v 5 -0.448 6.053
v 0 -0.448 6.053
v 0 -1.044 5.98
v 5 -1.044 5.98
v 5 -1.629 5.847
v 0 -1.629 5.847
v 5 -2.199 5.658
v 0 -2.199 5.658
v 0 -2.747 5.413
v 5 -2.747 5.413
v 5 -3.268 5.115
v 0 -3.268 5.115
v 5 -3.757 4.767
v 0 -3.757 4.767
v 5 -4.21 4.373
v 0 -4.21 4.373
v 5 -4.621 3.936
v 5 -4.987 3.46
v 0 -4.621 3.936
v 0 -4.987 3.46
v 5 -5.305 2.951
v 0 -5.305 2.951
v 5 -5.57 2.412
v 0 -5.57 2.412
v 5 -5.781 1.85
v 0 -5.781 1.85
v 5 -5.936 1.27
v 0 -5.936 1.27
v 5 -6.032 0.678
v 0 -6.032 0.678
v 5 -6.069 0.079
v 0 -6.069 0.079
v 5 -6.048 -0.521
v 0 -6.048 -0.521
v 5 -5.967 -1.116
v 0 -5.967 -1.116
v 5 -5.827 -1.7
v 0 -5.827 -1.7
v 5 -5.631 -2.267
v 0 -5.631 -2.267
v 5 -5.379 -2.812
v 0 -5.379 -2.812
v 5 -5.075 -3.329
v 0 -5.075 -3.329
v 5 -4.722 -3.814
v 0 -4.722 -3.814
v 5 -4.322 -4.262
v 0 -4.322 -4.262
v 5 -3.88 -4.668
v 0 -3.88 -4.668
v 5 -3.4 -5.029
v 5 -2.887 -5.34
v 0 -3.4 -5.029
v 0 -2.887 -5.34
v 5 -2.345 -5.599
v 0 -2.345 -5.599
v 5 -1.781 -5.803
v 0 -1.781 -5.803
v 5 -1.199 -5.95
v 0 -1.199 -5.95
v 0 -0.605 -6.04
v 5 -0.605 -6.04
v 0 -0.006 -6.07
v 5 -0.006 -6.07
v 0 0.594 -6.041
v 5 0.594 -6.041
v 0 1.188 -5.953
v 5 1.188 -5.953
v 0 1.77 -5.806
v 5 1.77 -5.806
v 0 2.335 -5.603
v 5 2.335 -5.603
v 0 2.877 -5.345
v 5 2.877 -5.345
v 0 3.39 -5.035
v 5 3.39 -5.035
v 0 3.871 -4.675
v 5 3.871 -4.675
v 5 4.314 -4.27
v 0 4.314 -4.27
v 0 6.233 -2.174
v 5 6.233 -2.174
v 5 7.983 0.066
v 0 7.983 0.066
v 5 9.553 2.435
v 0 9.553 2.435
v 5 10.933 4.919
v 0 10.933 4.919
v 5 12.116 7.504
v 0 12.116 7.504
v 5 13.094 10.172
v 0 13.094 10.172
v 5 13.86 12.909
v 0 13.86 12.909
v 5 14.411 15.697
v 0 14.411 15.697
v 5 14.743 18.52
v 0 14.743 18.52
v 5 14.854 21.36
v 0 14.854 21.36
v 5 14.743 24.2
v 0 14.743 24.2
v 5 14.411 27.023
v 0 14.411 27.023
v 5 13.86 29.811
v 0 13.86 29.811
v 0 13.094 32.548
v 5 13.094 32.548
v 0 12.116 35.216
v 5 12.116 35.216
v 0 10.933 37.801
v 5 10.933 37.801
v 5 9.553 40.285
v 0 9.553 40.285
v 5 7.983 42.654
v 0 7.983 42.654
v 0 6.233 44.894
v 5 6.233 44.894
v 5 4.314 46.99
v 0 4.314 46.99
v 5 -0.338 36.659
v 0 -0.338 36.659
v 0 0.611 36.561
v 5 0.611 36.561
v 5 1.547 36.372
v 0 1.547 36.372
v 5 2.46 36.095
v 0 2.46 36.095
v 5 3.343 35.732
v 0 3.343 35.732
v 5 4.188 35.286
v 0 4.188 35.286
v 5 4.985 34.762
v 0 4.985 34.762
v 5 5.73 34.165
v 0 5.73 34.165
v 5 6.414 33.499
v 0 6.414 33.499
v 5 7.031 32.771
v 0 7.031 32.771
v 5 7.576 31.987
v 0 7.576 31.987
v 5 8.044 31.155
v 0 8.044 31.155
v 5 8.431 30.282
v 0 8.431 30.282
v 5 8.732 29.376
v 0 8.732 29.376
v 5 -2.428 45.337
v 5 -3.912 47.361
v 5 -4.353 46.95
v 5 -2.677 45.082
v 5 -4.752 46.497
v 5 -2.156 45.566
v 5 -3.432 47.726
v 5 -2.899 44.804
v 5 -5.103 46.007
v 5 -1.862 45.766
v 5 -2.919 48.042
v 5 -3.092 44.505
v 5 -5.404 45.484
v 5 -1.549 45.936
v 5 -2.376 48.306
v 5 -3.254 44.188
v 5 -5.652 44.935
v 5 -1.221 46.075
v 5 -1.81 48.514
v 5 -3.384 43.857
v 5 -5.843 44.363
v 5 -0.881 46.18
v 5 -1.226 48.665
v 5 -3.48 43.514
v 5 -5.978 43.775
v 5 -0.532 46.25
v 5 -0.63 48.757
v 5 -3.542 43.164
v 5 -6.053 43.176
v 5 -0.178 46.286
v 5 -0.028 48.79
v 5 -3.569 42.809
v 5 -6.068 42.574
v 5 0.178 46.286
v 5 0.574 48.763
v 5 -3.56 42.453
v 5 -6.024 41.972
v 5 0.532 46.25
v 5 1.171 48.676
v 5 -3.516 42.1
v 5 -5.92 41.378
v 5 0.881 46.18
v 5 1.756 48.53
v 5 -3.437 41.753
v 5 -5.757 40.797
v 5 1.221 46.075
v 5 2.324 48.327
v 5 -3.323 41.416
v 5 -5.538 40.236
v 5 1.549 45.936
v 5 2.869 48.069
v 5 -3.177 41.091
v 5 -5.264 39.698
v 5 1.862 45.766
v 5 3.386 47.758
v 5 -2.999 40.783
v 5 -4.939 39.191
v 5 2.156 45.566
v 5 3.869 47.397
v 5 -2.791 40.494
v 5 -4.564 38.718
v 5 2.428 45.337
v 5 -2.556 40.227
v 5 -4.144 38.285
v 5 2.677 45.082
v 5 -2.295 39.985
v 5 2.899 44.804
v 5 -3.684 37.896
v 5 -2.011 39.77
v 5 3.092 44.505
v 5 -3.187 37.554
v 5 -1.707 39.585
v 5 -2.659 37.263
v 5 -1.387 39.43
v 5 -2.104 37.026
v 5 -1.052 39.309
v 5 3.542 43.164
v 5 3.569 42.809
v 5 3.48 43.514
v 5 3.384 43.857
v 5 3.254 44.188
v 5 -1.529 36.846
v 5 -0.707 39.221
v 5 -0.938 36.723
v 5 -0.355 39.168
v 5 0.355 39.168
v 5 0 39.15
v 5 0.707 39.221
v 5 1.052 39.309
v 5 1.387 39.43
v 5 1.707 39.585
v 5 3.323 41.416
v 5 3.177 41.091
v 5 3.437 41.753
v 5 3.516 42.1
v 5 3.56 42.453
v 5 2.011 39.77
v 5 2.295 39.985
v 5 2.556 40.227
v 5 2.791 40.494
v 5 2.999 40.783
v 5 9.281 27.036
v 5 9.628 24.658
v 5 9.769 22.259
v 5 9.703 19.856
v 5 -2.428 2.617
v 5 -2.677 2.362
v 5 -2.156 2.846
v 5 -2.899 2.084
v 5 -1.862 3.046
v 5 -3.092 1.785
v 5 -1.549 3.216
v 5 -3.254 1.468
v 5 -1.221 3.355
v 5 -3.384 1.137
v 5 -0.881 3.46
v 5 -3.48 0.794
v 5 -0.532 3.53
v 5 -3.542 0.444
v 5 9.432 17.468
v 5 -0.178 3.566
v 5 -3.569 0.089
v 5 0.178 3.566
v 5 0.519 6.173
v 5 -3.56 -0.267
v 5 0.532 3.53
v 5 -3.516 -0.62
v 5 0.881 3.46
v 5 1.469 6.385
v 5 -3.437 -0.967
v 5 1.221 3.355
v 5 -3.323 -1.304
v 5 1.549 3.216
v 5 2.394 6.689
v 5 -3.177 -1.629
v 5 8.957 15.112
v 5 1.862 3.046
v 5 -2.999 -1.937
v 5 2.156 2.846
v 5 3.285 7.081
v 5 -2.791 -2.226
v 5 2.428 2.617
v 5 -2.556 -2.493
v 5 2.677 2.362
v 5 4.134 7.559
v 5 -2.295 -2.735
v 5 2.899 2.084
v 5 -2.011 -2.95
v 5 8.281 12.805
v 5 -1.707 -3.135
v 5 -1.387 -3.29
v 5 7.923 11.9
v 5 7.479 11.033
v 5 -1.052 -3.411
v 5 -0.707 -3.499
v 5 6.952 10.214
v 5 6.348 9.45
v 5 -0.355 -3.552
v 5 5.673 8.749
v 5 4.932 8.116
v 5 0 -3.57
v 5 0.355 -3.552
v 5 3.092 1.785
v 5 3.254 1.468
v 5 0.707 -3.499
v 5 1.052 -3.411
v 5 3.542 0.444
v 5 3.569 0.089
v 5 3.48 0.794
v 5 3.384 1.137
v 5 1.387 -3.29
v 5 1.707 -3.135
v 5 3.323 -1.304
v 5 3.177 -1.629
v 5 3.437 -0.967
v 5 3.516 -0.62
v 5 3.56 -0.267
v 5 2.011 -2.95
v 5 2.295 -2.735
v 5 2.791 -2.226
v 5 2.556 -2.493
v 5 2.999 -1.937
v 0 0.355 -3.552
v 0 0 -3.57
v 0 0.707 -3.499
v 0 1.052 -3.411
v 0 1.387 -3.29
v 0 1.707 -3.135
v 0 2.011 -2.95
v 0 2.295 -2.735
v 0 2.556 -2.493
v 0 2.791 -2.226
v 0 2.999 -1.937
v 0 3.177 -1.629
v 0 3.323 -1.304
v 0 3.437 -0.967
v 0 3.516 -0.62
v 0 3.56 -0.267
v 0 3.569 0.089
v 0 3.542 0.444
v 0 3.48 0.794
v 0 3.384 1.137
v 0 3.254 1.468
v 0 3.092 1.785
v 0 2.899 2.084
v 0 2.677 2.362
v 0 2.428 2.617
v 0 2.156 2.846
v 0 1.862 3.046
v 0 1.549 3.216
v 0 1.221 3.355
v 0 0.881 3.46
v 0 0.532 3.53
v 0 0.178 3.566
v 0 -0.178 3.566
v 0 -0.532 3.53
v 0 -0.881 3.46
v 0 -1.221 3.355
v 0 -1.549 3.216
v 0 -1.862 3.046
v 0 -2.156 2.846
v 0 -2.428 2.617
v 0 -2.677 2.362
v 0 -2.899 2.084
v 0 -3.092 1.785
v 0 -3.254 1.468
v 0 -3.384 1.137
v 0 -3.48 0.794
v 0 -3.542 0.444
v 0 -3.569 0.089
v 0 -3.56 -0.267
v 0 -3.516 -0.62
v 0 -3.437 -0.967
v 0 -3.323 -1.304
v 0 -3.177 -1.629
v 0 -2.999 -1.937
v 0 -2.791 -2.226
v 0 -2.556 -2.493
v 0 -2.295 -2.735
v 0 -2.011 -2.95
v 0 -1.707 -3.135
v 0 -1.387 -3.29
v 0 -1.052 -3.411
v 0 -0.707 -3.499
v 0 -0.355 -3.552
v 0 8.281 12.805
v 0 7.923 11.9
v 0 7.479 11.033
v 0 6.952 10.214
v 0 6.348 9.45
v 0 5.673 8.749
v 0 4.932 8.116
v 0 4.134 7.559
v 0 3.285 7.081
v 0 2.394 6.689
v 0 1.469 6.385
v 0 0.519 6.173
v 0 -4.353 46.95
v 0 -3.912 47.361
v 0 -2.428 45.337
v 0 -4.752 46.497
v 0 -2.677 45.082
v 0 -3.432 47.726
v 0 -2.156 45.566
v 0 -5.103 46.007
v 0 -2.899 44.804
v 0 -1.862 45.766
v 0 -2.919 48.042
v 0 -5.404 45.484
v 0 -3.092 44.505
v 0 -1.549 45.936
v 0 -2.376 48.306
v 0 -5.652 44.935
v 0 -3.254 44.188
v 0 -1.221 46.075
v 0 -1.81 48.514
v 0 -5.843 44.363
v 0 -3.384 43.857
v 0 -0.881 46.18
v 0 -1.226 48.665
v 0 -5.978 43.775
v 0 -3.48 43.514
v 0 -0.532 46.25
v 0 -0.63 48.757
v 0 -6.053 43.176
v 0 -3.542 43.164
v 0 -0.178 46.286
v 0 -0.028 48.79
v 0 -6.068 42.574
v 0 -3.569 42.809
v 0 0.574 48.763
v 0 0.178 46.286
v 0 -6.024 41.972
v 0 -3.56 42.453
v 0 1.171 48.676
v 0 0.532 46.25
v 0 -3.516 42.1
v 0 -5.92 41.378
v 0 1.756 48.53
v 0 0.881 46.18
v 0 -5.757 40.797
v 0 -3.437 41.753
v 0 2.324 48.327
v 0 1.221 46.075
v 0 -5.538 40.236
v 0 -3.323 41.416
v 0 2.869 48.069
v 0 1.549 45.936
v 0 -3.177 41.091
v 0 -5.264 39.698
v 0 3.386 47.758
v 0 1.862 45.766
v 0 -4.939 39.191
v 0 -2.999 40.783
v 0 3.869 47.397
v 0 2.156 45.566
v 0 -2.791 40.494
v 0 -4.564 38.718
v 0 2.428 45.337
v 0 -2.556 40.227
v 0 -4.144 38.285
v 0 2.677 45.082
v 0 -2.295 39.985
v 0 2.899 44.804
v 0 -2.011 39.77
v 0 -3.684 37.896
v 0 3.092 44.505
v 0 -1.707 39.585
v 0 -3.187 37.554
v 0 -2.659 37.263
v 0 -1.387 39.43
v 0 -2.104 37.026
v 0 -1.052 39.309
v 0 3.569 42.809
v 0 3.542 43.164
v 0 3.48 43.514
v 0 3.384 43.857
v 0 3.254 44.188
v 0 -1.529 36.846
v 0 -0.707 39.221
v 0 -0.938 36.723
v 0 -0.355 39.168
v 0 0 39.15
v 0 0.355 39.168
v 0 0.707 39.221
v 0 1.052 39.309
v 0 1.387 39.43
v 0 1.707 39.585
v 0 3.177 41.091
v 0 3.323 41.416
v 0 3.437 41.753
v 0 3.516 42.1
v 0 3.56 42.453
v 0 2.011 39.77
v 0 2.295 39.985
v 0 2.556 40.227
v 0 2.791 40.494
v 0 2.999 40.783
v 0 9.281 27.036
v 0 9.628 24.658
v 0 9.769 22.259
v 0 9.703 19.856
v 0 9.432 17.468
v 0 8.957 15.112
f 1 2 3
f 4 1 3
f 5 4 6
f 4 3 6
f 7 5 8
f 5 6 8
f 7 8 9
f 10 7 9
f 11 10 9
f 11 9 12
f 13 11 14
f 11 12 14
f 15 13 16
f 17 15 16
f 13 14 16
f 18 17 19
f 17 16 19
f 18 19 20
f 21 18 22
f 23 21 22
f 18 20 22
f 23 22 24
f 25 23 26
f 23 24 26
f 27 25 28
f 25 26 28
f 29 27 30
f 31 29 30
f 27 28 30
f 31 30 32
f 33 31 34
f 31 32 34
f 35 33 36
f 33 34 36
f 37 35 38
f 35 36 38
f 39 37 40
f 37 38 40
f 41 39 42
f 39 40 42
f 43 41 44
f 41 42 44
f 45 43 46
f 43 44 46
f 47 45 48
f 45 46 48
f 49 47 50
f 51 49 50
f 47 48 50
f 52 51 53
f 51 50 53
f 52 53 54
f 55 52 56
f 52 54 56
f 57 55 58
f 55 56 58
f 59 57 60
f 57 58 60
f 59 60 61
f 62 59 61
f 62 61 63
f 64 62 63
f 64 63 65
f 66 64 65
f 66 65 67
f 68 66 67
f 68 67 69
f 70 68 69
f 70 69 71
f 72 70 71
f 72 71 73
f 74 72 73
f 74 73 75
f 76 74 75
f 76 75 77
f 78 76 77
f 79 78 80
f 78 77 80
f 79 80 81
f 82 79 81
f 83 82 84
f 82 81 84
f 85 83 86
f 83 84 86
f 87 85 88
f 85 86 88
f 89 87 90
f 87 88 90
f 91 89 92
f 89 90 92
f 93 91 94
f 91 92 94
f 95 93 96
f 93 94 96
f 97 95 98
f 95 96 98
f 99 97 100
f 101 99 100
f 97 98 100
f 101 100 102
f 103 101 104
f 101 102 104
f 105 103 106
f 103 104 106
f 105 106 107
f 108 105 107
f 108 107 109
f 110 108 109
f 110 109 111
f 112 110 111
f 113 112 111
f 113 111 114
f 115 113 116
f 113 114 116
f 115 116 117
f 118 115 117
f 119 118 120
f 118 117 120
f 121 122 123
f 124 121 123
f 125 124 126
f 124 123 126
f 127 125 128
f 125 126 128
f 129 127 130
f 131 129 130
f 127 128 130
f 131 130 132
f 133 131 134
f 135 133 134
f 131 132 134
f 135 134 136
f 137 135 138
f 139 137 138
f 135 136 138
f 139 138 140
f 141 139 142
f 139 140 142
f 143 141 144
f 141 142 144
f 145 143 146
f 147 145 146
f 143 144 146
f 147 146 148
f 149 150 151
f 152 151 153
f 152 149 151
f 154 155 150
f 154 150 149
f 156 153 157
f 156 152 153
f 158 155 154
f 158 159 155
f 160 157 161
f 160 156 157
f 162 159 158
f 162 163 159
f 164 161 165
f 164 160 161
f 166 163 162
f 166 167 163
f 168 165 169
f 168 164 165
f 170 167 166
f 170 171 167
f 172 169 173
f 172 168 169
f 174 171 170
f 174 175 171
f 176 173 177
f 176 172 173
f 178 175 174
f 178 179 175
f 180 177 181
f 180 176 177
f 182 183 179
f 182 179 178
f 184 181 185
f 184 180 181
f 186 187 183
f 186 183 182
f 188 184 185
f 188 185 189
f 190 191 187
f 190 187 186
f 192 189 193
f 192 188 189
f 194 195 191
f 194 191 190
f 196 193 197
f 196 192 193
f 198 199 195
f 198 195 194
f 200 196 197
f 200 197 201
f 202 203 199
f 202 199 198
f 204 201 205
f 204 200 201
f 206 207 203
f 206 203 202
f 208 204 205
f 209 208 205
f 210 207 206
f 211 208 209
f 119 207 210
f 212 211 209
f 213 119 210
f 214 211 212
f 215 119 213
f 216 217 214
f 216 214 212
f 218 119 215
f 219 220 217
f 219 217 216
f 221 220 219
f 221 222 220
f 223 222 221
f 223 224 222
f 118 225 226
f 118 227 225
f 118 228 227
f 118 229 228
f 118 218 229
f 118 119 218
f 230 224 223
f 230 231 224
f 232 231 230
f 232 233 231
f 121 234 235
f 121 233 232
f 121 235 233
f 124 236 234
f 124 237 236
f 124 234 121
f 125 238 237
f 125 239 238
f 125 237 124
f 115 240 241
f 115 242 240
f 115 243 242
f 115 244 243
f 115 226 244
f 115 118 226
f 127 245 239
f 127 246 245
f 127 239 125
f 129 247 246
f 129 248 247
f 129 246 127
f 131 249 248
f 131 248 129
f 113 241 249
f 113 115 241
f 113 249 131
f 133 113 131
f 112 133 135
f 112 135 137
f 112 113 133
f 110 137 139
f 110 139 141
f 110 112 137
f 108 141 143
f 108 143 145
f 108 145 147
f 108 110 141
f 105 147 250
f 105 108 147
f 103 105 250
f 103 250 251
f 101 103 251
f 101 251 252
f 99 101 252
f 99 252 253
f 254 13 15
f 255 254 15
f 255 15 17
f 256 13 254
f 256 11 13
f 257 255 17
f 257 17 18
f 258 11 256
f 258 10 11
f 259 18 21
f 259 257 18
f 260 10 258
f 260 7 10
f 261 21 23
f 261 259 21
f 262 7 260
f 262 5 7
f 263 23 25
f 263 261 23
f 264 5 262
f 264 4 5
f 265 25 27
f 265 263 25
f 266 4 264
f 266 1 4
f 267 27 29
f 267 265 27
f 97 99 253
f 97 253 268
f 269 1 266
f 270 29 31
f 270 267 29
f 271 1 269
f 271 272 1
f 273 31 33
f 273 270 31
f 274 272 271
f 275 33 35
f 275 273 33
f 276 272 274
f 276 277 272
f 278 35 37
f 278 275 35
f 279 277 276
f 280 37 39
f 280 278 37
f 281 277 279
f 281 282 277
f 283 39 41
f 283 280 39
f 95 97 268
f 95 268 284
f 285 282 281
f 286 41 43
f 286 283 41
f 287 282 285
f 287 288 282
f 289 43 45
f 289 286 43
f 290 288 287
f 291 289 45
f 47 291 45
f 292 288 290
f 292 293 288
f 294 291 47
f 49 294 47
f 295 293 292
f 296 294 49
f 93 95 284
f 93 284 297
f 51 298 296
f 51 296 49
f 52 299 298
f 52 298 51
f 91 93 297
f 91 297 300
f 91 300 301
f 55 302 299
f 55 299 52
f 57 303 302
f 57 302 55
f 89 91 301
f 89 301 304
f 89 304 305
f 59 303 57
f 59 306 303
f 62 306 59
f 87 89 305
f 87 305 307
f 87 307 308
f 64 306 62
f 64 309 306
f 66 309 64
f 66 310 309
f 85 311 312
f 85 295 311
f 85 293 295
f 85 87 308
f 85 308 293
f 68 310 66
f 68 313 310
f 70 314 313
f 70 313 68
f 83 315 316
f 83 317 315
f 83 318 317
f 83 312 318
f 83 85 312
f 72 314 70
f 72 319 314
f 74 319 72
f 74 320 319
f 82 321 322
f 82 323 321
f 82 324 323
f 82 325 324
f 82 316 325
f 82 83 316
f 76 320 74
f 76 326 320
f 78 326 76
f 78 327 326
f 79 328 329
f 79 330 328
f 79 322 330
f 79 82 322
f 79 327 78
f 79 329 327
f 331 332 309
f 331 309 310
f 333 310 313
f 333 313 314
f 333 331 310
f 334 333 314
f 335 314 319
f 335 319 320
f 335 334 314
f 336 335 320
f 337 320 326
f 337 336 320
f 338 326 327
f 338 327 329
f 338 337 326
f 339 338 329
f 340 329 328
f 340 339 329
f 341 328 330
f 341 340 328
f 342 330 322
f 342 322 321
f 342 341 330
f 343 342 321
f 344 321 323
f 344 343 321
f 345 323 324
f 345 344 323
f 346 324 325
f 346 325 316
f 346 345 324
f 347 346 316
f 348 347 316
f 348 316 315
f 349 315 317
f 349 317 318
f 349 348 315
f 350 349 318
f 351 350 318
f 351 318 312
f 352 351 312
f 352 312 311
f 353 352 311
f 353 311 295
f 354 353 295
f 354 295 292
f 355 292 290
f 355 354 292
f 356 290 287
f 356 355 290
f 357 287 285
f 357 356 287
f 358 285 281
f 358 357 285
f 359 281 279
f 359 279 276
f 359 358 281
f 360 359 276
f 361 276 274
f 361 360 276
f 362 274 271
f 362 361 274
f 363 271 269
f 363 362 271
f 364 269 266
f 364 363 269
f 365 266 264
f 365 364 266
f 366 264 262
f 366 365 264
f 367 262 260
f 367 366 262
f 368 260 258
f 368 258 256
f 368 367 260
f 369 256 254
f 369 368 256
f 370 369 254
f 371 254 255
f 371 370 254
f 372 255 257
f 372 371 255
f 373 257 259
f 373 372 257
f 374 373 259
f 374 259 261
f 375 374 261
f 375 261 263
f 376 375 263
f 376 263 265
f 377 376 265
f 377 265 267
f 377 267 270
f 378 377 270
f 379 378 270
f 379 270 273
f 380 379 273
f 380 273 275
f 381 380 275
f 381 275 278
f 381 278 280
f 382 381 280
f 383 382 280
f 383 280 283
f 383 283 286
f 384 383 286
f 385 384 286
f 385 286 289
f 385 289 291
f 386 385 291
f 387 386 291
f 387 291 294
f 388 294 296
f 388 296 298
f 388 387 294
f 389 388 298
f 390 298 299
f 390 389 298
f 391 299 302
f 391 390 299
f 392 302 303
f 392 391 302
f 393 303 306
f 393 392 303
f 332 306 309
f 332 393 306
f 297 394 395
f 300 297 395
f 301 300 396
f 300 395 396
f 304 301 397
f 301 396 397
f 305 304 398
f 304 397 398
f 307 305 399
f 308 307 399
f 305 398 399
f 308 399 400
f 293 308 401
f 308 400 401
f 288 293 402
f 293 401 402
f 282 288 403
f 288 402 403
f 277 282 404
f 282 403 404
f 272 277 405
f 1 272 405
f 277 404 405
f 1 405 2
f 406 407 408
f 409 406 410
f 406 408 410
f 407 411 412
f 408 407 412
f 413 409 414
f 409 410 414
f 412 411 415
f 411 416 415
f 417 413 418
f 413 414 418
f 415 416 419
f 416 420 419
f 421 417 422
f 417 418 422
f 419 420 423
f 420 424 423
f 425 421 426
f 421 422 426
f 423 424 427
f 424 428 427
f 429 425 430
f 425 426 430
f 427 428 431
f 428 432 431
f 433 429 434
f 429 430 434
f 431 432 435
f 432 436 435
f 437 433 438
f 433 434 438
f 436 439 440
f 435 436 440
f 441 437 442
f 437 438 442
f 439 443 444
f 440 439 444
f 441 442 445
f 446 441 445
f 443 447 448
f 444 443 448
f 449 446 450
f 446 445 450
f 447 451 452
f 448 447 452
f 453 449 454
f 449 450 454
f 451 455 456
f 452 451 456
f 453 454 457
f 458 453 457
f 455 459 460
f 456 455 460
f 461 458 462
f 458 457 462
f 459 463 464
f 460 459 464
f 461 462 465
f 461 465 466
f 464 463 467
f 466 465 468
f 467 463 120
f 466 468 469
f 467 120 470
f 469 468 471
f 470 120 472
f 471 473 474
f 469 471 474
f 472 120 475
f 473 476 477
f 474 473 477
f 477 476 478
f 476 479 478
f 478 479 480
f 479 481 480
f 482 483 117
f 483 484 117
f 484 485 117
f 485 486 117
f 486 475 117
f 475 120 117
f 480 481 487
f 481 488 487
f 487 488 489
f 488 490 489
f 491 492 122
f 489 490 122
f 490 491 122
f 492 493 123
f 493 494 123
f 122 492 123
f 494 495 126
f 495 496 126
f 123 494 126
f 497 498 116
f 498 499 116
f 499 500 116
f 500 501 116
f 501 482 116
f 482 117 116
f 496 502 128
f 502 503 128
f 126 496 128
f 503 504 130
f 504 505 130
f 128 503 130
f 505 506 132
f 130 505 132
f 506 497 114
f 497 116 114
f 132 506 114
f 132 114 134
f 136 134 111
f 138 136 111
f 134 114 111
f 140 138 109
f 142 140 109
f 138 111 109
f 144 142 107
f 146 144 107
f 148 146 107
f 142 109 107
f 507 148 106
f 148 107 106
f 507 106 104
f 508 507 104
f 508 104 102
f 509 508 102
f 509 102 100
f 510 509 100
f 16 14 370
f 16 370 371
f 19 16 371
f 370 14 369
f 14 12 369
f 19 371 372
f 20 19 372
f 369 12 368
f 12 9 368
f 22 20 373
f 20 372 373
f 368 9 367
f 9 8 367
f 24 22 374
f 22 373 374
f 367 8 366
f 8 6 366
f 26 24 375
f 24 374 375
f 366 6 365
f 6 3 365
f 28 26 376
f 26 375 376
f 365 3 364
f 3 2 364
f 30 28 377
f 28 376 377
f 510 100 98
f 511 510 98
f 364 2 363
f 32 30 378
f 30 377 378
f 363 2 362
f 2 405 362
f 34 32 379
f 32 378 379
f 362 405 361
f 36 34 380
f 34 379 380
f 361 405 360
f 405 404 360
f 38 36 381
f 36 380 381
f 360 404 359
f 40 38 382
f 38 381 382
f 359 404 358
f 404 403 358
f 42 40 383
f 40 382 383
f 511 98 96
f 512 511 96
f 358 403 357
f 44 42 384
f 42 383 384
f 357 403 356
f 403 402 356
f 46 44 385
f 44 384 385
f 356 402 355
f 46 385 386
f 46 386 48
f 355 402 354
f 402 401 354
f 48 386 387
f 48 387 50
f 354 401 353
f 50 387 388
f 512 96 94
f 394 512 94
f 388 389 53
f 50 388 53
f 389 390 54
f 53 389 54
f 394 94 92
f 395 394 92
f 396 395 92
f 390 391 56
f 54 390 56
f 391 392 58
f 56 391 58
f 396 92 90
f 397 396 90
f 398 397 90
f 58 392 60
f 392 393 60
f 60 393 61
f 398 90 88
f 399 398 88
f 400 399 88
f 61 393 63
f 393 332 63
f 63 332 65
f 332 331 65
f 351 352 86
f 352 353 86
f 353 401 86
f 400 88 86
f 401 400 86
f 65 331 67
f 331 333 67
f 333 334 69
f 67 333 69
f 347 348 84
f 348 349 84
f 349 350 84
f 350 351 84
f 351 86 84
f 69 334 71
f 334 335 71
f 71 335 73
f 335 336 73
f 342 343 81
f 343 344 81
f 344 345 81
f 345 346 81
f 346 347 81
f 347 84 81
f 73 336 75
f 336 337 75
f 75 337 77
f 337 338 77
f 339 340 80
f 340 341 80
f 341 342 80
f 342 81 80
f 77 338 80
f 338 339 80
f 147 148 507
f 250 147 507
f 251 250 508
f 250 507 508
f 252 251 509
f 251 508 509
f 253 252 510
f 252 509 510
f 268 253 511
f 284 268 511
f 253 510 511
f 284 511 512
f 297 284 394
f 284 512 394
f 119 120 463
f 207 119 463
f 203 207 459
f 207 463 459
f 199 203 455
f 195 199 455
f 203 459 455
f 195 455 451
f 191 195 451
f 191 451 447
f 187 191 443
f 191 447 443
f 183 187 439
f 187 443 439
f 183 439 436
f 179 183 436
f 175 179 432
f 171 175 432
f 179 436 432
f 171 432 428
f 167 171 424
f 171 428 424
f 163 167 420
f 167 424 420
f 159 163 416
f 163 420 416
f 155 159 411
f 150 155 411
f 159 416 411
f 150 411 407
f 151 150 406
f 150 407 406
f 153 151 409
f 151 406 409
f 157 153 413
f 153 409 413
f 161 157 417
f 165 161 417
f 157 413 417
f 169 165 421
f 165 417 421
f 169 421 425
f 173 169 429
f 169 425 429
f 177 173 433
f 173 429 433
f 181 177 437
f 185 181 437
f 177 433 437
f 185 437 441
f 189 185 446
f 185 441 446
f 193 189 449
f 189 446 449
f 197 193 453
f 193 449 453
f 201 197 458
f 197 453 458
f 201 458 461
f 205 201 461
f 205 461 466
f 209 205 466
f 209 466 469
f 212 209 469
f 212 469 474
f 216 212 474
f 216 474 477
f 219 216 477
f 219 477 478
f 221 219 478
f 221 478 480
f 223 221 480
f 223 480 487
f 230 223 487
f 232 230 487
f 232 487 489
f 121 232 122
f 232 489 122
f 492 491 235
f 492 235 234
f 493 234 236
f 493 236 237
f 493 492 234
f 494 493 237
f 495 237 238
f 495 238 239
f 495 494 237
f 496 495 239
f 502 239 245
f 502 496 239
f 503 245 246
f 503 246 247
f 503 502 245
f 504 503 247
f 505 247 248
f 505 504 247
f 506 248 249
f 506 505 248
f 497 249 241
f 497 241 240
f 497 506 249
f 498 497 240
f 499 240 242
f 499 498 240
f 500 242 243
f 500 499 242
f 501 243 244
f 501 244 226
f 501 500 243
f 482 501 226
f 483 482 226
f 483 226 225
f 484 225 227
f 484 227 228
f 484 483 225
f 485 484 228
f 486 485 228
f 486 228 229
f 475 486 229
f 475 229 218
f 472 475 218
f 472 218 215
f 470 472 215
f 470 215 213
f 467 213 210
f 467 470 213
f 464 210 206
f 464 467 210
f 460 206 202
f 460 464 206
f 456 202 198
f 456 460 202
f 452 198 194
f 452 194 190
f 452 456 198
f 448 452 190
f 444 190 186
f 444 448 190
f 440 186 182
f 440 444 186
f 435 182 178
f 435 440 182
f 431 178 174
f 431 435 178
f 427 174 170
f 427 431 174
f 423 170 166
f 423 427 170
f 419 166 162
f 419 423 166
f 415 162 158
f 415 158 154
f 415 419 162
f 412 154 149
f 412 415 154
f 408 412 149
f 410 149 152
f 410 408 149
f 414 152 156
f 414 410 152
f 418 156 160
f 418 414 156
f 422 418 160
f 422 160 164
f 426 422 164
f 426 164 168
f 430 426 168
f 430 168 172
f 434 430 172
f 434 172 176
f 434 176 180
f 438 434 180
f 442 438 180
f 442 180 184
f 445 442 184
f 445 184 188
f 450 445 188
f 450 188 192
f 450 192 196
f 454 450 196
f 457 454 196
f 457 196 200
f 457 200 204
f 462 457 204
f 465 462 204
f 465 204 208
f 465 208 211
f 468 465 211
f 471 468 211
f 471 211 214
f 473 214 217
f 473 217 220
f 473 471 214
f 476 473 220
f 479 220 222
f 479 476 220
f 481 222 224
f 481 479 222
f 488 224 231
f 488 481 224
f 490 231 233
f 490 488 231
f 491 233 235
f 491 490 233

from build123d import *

# Parameters (mm, degrees)
SKETCH1_R           = 3.57
BOSS_EXTRUDE1_DEPTH = 5


with BuildPart() as part:
    # Sketch1 → Boss-Extrude1 (new body)
    with BuildSketch(Plane(origin=(0, 0, 0), x_dir=(0, 0, -1), z_dir=(1, 0, 0))):
        with BuildLine():
            ThreePointArc((4.27020031, 4.313964454), (-21.36, 14.853878163), (-46.99020031, 4.313964454))
            ThreePointArc((-46.99020031, 4.313964454), (-45.212525236, -5.534638014), (-36.65944536, -0.338492916))
            ThreePointArc((-36.65944536, -0.338492916), (-34.472469129, 5.364814131), (-29.3762145, 8.732122411))
            ThreePointArc((-29.3762145, 8.732122411), (-21.056615852, 9.761945239), (-12.805336851, 8.281184769))
            ThreePointArc((-12.805336851, 8.281184769), (-8.116246419, 4.932321146), (-6.05344864, -0.447950405))
            ThreePointArc((-6.05344864, -0.447950405), (2.54243032, -5.511891514), (4.27020031, 4.313964454))
        make_face()
        Circle(SKETCH1_R, mode=Mode.SUBTRACT)
        with Locations((-42.72, 0)):
            Circle(SKETCH1_R, mode=Mode.SUBTRACT)
    extrude(amount=BOSS_EXTRUDE1_DEPTH)


solid = part.part
